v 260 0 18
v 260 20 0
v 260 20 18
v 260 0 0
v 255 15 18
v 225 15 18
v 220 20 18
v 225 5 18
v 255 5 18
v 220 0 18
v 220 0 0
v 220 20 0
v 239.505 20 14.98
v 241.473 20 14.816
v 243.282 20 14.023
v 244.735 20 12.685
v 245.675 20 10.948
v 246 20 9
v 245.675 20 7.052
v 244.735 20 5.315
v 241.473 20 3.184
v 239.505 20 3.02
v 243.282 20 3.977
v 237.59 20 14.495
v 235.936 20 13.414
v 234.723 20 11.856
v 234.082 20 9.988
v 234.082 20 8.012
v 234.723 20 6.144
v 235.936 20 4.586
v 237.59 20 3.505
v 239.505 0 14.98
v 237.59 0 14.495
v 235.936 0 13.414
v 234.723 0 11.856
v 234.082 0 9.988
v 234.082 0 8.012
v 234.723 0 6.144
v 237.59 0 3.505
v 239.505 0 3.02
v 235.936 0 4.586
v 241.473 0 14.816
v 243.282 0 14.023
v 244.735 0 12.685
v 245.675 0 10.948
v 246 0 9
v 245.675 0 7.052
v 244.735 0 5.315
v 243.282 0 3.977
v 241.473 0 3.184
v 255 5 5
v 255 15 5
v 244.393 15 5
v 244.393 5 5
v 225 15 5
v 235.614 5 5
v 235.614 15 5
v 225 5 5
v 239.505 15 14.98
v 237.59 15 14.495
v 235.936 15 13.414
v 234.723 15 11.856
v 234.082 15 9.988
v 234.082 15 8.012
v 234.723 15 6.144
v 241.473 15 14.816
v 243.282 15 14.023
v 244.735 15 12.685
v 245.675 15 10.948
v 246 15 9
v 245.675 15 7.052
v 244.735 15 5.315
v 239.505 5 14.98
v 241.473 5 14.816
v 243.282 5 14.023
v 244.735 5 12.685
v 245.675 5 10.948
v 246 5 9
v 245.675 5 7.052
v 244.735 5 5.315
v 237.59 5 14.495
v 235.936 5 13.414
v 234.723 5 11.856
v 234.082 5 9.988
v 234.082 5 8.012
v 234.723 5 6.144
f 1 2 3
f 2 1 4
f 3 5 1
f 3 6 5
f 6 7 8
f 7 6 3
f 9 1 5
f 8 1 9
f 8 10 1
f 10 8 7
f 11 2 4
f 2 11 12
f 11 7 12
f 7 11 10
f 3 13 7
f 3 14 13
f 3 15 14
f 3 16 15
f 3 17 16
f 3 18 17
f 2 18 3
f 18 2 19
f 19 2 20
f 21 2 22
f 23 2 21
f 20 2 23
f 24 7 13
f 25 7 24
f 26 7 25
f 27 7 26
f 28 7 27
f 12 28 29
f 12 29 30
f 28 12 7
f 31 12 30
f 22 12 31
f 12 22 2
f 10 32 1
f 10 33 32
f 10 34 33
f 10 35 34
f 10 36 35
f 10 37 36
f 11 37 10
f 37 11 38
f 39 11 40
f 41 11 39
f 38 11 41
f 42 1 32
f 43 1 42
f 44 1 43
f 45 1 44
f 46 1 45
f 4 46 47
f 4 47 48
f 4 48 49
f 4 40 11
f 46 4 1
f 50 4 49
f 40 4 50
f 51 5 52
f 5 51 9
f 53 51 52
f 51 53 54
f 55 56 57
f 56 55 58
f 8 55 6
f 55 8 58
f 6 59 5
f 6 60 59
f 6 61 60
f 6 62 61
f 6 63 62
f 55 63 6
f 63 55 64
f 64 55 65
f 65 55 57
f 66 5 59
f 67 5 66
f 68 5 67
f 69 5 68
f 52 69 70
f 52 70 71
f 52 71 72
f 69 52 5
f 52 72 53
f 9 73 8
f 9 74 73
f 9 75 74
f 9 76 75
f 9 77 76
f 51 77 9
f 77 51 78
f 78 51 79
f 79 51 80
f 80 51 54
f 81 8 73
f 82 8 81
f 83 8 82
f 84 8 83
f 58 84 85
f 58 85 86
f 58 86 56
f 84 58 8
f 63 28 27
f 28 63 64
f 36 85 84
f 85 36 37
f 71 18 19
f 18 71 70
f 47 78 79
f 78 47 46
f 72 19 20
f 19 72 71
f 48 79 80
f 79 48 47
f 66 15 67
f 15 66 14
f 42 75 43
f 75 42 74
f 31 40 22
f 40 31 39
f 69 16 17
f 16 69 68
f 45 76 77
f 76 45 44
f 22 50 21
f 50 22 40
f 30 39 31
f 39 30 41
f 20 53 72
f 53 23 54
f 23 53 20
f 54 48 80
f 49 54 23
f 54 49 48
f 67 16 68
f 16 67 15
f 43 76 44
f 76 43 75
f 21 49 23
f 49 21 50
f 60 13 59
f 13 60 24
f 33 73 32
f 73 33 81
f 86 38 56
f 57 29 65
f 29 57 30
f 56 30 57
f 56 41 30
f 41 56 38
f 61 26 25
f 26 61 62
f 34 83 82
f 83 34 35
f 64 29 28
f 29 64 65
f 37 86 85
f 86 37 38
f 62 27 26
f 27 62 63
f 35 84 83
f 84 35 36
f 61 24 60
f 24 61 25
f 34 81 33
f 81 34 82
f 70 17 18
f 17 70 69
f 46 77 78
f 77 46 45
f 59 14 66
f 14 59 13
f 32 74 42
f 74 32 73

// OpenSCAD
// file: ladder_level_B.scad
// LadderLevel Template B — Heavy duty thicker walls
$fn=32;
L=190; W=85; Hmax=55; Hmin=10;
module wedge(){
  difference(){
    linear_extrude(W) polygon([[0,0],[L,0],[L,Hmin],[0,Hmax]]);
    for(i=[0:16]) translate([14+i*10, Hmin+i*2.4, W/2-20])
      rotate([0,0,8]) cube([6,10,40], center=true);
    translate([25,Hmax-4,12]) cube([100,5,W-24]);
  }
}
wedge();
translate([0,0,W+12]) mirror([0,0,1]) wedge();
// main file
// LadderLevel Template C — includes vial clip + sling plate
use <ladder_level_B.scad>
// Additional clip for bubble vial
translate([220,0,0]) difference(){
  cube([40,20,18]);
  translate([5,5,5]) cube([30,10,20]);
  translate([20, -0.1, 9]) rotate([-90,0,0]) cylinder(h=25,r=6);
}
